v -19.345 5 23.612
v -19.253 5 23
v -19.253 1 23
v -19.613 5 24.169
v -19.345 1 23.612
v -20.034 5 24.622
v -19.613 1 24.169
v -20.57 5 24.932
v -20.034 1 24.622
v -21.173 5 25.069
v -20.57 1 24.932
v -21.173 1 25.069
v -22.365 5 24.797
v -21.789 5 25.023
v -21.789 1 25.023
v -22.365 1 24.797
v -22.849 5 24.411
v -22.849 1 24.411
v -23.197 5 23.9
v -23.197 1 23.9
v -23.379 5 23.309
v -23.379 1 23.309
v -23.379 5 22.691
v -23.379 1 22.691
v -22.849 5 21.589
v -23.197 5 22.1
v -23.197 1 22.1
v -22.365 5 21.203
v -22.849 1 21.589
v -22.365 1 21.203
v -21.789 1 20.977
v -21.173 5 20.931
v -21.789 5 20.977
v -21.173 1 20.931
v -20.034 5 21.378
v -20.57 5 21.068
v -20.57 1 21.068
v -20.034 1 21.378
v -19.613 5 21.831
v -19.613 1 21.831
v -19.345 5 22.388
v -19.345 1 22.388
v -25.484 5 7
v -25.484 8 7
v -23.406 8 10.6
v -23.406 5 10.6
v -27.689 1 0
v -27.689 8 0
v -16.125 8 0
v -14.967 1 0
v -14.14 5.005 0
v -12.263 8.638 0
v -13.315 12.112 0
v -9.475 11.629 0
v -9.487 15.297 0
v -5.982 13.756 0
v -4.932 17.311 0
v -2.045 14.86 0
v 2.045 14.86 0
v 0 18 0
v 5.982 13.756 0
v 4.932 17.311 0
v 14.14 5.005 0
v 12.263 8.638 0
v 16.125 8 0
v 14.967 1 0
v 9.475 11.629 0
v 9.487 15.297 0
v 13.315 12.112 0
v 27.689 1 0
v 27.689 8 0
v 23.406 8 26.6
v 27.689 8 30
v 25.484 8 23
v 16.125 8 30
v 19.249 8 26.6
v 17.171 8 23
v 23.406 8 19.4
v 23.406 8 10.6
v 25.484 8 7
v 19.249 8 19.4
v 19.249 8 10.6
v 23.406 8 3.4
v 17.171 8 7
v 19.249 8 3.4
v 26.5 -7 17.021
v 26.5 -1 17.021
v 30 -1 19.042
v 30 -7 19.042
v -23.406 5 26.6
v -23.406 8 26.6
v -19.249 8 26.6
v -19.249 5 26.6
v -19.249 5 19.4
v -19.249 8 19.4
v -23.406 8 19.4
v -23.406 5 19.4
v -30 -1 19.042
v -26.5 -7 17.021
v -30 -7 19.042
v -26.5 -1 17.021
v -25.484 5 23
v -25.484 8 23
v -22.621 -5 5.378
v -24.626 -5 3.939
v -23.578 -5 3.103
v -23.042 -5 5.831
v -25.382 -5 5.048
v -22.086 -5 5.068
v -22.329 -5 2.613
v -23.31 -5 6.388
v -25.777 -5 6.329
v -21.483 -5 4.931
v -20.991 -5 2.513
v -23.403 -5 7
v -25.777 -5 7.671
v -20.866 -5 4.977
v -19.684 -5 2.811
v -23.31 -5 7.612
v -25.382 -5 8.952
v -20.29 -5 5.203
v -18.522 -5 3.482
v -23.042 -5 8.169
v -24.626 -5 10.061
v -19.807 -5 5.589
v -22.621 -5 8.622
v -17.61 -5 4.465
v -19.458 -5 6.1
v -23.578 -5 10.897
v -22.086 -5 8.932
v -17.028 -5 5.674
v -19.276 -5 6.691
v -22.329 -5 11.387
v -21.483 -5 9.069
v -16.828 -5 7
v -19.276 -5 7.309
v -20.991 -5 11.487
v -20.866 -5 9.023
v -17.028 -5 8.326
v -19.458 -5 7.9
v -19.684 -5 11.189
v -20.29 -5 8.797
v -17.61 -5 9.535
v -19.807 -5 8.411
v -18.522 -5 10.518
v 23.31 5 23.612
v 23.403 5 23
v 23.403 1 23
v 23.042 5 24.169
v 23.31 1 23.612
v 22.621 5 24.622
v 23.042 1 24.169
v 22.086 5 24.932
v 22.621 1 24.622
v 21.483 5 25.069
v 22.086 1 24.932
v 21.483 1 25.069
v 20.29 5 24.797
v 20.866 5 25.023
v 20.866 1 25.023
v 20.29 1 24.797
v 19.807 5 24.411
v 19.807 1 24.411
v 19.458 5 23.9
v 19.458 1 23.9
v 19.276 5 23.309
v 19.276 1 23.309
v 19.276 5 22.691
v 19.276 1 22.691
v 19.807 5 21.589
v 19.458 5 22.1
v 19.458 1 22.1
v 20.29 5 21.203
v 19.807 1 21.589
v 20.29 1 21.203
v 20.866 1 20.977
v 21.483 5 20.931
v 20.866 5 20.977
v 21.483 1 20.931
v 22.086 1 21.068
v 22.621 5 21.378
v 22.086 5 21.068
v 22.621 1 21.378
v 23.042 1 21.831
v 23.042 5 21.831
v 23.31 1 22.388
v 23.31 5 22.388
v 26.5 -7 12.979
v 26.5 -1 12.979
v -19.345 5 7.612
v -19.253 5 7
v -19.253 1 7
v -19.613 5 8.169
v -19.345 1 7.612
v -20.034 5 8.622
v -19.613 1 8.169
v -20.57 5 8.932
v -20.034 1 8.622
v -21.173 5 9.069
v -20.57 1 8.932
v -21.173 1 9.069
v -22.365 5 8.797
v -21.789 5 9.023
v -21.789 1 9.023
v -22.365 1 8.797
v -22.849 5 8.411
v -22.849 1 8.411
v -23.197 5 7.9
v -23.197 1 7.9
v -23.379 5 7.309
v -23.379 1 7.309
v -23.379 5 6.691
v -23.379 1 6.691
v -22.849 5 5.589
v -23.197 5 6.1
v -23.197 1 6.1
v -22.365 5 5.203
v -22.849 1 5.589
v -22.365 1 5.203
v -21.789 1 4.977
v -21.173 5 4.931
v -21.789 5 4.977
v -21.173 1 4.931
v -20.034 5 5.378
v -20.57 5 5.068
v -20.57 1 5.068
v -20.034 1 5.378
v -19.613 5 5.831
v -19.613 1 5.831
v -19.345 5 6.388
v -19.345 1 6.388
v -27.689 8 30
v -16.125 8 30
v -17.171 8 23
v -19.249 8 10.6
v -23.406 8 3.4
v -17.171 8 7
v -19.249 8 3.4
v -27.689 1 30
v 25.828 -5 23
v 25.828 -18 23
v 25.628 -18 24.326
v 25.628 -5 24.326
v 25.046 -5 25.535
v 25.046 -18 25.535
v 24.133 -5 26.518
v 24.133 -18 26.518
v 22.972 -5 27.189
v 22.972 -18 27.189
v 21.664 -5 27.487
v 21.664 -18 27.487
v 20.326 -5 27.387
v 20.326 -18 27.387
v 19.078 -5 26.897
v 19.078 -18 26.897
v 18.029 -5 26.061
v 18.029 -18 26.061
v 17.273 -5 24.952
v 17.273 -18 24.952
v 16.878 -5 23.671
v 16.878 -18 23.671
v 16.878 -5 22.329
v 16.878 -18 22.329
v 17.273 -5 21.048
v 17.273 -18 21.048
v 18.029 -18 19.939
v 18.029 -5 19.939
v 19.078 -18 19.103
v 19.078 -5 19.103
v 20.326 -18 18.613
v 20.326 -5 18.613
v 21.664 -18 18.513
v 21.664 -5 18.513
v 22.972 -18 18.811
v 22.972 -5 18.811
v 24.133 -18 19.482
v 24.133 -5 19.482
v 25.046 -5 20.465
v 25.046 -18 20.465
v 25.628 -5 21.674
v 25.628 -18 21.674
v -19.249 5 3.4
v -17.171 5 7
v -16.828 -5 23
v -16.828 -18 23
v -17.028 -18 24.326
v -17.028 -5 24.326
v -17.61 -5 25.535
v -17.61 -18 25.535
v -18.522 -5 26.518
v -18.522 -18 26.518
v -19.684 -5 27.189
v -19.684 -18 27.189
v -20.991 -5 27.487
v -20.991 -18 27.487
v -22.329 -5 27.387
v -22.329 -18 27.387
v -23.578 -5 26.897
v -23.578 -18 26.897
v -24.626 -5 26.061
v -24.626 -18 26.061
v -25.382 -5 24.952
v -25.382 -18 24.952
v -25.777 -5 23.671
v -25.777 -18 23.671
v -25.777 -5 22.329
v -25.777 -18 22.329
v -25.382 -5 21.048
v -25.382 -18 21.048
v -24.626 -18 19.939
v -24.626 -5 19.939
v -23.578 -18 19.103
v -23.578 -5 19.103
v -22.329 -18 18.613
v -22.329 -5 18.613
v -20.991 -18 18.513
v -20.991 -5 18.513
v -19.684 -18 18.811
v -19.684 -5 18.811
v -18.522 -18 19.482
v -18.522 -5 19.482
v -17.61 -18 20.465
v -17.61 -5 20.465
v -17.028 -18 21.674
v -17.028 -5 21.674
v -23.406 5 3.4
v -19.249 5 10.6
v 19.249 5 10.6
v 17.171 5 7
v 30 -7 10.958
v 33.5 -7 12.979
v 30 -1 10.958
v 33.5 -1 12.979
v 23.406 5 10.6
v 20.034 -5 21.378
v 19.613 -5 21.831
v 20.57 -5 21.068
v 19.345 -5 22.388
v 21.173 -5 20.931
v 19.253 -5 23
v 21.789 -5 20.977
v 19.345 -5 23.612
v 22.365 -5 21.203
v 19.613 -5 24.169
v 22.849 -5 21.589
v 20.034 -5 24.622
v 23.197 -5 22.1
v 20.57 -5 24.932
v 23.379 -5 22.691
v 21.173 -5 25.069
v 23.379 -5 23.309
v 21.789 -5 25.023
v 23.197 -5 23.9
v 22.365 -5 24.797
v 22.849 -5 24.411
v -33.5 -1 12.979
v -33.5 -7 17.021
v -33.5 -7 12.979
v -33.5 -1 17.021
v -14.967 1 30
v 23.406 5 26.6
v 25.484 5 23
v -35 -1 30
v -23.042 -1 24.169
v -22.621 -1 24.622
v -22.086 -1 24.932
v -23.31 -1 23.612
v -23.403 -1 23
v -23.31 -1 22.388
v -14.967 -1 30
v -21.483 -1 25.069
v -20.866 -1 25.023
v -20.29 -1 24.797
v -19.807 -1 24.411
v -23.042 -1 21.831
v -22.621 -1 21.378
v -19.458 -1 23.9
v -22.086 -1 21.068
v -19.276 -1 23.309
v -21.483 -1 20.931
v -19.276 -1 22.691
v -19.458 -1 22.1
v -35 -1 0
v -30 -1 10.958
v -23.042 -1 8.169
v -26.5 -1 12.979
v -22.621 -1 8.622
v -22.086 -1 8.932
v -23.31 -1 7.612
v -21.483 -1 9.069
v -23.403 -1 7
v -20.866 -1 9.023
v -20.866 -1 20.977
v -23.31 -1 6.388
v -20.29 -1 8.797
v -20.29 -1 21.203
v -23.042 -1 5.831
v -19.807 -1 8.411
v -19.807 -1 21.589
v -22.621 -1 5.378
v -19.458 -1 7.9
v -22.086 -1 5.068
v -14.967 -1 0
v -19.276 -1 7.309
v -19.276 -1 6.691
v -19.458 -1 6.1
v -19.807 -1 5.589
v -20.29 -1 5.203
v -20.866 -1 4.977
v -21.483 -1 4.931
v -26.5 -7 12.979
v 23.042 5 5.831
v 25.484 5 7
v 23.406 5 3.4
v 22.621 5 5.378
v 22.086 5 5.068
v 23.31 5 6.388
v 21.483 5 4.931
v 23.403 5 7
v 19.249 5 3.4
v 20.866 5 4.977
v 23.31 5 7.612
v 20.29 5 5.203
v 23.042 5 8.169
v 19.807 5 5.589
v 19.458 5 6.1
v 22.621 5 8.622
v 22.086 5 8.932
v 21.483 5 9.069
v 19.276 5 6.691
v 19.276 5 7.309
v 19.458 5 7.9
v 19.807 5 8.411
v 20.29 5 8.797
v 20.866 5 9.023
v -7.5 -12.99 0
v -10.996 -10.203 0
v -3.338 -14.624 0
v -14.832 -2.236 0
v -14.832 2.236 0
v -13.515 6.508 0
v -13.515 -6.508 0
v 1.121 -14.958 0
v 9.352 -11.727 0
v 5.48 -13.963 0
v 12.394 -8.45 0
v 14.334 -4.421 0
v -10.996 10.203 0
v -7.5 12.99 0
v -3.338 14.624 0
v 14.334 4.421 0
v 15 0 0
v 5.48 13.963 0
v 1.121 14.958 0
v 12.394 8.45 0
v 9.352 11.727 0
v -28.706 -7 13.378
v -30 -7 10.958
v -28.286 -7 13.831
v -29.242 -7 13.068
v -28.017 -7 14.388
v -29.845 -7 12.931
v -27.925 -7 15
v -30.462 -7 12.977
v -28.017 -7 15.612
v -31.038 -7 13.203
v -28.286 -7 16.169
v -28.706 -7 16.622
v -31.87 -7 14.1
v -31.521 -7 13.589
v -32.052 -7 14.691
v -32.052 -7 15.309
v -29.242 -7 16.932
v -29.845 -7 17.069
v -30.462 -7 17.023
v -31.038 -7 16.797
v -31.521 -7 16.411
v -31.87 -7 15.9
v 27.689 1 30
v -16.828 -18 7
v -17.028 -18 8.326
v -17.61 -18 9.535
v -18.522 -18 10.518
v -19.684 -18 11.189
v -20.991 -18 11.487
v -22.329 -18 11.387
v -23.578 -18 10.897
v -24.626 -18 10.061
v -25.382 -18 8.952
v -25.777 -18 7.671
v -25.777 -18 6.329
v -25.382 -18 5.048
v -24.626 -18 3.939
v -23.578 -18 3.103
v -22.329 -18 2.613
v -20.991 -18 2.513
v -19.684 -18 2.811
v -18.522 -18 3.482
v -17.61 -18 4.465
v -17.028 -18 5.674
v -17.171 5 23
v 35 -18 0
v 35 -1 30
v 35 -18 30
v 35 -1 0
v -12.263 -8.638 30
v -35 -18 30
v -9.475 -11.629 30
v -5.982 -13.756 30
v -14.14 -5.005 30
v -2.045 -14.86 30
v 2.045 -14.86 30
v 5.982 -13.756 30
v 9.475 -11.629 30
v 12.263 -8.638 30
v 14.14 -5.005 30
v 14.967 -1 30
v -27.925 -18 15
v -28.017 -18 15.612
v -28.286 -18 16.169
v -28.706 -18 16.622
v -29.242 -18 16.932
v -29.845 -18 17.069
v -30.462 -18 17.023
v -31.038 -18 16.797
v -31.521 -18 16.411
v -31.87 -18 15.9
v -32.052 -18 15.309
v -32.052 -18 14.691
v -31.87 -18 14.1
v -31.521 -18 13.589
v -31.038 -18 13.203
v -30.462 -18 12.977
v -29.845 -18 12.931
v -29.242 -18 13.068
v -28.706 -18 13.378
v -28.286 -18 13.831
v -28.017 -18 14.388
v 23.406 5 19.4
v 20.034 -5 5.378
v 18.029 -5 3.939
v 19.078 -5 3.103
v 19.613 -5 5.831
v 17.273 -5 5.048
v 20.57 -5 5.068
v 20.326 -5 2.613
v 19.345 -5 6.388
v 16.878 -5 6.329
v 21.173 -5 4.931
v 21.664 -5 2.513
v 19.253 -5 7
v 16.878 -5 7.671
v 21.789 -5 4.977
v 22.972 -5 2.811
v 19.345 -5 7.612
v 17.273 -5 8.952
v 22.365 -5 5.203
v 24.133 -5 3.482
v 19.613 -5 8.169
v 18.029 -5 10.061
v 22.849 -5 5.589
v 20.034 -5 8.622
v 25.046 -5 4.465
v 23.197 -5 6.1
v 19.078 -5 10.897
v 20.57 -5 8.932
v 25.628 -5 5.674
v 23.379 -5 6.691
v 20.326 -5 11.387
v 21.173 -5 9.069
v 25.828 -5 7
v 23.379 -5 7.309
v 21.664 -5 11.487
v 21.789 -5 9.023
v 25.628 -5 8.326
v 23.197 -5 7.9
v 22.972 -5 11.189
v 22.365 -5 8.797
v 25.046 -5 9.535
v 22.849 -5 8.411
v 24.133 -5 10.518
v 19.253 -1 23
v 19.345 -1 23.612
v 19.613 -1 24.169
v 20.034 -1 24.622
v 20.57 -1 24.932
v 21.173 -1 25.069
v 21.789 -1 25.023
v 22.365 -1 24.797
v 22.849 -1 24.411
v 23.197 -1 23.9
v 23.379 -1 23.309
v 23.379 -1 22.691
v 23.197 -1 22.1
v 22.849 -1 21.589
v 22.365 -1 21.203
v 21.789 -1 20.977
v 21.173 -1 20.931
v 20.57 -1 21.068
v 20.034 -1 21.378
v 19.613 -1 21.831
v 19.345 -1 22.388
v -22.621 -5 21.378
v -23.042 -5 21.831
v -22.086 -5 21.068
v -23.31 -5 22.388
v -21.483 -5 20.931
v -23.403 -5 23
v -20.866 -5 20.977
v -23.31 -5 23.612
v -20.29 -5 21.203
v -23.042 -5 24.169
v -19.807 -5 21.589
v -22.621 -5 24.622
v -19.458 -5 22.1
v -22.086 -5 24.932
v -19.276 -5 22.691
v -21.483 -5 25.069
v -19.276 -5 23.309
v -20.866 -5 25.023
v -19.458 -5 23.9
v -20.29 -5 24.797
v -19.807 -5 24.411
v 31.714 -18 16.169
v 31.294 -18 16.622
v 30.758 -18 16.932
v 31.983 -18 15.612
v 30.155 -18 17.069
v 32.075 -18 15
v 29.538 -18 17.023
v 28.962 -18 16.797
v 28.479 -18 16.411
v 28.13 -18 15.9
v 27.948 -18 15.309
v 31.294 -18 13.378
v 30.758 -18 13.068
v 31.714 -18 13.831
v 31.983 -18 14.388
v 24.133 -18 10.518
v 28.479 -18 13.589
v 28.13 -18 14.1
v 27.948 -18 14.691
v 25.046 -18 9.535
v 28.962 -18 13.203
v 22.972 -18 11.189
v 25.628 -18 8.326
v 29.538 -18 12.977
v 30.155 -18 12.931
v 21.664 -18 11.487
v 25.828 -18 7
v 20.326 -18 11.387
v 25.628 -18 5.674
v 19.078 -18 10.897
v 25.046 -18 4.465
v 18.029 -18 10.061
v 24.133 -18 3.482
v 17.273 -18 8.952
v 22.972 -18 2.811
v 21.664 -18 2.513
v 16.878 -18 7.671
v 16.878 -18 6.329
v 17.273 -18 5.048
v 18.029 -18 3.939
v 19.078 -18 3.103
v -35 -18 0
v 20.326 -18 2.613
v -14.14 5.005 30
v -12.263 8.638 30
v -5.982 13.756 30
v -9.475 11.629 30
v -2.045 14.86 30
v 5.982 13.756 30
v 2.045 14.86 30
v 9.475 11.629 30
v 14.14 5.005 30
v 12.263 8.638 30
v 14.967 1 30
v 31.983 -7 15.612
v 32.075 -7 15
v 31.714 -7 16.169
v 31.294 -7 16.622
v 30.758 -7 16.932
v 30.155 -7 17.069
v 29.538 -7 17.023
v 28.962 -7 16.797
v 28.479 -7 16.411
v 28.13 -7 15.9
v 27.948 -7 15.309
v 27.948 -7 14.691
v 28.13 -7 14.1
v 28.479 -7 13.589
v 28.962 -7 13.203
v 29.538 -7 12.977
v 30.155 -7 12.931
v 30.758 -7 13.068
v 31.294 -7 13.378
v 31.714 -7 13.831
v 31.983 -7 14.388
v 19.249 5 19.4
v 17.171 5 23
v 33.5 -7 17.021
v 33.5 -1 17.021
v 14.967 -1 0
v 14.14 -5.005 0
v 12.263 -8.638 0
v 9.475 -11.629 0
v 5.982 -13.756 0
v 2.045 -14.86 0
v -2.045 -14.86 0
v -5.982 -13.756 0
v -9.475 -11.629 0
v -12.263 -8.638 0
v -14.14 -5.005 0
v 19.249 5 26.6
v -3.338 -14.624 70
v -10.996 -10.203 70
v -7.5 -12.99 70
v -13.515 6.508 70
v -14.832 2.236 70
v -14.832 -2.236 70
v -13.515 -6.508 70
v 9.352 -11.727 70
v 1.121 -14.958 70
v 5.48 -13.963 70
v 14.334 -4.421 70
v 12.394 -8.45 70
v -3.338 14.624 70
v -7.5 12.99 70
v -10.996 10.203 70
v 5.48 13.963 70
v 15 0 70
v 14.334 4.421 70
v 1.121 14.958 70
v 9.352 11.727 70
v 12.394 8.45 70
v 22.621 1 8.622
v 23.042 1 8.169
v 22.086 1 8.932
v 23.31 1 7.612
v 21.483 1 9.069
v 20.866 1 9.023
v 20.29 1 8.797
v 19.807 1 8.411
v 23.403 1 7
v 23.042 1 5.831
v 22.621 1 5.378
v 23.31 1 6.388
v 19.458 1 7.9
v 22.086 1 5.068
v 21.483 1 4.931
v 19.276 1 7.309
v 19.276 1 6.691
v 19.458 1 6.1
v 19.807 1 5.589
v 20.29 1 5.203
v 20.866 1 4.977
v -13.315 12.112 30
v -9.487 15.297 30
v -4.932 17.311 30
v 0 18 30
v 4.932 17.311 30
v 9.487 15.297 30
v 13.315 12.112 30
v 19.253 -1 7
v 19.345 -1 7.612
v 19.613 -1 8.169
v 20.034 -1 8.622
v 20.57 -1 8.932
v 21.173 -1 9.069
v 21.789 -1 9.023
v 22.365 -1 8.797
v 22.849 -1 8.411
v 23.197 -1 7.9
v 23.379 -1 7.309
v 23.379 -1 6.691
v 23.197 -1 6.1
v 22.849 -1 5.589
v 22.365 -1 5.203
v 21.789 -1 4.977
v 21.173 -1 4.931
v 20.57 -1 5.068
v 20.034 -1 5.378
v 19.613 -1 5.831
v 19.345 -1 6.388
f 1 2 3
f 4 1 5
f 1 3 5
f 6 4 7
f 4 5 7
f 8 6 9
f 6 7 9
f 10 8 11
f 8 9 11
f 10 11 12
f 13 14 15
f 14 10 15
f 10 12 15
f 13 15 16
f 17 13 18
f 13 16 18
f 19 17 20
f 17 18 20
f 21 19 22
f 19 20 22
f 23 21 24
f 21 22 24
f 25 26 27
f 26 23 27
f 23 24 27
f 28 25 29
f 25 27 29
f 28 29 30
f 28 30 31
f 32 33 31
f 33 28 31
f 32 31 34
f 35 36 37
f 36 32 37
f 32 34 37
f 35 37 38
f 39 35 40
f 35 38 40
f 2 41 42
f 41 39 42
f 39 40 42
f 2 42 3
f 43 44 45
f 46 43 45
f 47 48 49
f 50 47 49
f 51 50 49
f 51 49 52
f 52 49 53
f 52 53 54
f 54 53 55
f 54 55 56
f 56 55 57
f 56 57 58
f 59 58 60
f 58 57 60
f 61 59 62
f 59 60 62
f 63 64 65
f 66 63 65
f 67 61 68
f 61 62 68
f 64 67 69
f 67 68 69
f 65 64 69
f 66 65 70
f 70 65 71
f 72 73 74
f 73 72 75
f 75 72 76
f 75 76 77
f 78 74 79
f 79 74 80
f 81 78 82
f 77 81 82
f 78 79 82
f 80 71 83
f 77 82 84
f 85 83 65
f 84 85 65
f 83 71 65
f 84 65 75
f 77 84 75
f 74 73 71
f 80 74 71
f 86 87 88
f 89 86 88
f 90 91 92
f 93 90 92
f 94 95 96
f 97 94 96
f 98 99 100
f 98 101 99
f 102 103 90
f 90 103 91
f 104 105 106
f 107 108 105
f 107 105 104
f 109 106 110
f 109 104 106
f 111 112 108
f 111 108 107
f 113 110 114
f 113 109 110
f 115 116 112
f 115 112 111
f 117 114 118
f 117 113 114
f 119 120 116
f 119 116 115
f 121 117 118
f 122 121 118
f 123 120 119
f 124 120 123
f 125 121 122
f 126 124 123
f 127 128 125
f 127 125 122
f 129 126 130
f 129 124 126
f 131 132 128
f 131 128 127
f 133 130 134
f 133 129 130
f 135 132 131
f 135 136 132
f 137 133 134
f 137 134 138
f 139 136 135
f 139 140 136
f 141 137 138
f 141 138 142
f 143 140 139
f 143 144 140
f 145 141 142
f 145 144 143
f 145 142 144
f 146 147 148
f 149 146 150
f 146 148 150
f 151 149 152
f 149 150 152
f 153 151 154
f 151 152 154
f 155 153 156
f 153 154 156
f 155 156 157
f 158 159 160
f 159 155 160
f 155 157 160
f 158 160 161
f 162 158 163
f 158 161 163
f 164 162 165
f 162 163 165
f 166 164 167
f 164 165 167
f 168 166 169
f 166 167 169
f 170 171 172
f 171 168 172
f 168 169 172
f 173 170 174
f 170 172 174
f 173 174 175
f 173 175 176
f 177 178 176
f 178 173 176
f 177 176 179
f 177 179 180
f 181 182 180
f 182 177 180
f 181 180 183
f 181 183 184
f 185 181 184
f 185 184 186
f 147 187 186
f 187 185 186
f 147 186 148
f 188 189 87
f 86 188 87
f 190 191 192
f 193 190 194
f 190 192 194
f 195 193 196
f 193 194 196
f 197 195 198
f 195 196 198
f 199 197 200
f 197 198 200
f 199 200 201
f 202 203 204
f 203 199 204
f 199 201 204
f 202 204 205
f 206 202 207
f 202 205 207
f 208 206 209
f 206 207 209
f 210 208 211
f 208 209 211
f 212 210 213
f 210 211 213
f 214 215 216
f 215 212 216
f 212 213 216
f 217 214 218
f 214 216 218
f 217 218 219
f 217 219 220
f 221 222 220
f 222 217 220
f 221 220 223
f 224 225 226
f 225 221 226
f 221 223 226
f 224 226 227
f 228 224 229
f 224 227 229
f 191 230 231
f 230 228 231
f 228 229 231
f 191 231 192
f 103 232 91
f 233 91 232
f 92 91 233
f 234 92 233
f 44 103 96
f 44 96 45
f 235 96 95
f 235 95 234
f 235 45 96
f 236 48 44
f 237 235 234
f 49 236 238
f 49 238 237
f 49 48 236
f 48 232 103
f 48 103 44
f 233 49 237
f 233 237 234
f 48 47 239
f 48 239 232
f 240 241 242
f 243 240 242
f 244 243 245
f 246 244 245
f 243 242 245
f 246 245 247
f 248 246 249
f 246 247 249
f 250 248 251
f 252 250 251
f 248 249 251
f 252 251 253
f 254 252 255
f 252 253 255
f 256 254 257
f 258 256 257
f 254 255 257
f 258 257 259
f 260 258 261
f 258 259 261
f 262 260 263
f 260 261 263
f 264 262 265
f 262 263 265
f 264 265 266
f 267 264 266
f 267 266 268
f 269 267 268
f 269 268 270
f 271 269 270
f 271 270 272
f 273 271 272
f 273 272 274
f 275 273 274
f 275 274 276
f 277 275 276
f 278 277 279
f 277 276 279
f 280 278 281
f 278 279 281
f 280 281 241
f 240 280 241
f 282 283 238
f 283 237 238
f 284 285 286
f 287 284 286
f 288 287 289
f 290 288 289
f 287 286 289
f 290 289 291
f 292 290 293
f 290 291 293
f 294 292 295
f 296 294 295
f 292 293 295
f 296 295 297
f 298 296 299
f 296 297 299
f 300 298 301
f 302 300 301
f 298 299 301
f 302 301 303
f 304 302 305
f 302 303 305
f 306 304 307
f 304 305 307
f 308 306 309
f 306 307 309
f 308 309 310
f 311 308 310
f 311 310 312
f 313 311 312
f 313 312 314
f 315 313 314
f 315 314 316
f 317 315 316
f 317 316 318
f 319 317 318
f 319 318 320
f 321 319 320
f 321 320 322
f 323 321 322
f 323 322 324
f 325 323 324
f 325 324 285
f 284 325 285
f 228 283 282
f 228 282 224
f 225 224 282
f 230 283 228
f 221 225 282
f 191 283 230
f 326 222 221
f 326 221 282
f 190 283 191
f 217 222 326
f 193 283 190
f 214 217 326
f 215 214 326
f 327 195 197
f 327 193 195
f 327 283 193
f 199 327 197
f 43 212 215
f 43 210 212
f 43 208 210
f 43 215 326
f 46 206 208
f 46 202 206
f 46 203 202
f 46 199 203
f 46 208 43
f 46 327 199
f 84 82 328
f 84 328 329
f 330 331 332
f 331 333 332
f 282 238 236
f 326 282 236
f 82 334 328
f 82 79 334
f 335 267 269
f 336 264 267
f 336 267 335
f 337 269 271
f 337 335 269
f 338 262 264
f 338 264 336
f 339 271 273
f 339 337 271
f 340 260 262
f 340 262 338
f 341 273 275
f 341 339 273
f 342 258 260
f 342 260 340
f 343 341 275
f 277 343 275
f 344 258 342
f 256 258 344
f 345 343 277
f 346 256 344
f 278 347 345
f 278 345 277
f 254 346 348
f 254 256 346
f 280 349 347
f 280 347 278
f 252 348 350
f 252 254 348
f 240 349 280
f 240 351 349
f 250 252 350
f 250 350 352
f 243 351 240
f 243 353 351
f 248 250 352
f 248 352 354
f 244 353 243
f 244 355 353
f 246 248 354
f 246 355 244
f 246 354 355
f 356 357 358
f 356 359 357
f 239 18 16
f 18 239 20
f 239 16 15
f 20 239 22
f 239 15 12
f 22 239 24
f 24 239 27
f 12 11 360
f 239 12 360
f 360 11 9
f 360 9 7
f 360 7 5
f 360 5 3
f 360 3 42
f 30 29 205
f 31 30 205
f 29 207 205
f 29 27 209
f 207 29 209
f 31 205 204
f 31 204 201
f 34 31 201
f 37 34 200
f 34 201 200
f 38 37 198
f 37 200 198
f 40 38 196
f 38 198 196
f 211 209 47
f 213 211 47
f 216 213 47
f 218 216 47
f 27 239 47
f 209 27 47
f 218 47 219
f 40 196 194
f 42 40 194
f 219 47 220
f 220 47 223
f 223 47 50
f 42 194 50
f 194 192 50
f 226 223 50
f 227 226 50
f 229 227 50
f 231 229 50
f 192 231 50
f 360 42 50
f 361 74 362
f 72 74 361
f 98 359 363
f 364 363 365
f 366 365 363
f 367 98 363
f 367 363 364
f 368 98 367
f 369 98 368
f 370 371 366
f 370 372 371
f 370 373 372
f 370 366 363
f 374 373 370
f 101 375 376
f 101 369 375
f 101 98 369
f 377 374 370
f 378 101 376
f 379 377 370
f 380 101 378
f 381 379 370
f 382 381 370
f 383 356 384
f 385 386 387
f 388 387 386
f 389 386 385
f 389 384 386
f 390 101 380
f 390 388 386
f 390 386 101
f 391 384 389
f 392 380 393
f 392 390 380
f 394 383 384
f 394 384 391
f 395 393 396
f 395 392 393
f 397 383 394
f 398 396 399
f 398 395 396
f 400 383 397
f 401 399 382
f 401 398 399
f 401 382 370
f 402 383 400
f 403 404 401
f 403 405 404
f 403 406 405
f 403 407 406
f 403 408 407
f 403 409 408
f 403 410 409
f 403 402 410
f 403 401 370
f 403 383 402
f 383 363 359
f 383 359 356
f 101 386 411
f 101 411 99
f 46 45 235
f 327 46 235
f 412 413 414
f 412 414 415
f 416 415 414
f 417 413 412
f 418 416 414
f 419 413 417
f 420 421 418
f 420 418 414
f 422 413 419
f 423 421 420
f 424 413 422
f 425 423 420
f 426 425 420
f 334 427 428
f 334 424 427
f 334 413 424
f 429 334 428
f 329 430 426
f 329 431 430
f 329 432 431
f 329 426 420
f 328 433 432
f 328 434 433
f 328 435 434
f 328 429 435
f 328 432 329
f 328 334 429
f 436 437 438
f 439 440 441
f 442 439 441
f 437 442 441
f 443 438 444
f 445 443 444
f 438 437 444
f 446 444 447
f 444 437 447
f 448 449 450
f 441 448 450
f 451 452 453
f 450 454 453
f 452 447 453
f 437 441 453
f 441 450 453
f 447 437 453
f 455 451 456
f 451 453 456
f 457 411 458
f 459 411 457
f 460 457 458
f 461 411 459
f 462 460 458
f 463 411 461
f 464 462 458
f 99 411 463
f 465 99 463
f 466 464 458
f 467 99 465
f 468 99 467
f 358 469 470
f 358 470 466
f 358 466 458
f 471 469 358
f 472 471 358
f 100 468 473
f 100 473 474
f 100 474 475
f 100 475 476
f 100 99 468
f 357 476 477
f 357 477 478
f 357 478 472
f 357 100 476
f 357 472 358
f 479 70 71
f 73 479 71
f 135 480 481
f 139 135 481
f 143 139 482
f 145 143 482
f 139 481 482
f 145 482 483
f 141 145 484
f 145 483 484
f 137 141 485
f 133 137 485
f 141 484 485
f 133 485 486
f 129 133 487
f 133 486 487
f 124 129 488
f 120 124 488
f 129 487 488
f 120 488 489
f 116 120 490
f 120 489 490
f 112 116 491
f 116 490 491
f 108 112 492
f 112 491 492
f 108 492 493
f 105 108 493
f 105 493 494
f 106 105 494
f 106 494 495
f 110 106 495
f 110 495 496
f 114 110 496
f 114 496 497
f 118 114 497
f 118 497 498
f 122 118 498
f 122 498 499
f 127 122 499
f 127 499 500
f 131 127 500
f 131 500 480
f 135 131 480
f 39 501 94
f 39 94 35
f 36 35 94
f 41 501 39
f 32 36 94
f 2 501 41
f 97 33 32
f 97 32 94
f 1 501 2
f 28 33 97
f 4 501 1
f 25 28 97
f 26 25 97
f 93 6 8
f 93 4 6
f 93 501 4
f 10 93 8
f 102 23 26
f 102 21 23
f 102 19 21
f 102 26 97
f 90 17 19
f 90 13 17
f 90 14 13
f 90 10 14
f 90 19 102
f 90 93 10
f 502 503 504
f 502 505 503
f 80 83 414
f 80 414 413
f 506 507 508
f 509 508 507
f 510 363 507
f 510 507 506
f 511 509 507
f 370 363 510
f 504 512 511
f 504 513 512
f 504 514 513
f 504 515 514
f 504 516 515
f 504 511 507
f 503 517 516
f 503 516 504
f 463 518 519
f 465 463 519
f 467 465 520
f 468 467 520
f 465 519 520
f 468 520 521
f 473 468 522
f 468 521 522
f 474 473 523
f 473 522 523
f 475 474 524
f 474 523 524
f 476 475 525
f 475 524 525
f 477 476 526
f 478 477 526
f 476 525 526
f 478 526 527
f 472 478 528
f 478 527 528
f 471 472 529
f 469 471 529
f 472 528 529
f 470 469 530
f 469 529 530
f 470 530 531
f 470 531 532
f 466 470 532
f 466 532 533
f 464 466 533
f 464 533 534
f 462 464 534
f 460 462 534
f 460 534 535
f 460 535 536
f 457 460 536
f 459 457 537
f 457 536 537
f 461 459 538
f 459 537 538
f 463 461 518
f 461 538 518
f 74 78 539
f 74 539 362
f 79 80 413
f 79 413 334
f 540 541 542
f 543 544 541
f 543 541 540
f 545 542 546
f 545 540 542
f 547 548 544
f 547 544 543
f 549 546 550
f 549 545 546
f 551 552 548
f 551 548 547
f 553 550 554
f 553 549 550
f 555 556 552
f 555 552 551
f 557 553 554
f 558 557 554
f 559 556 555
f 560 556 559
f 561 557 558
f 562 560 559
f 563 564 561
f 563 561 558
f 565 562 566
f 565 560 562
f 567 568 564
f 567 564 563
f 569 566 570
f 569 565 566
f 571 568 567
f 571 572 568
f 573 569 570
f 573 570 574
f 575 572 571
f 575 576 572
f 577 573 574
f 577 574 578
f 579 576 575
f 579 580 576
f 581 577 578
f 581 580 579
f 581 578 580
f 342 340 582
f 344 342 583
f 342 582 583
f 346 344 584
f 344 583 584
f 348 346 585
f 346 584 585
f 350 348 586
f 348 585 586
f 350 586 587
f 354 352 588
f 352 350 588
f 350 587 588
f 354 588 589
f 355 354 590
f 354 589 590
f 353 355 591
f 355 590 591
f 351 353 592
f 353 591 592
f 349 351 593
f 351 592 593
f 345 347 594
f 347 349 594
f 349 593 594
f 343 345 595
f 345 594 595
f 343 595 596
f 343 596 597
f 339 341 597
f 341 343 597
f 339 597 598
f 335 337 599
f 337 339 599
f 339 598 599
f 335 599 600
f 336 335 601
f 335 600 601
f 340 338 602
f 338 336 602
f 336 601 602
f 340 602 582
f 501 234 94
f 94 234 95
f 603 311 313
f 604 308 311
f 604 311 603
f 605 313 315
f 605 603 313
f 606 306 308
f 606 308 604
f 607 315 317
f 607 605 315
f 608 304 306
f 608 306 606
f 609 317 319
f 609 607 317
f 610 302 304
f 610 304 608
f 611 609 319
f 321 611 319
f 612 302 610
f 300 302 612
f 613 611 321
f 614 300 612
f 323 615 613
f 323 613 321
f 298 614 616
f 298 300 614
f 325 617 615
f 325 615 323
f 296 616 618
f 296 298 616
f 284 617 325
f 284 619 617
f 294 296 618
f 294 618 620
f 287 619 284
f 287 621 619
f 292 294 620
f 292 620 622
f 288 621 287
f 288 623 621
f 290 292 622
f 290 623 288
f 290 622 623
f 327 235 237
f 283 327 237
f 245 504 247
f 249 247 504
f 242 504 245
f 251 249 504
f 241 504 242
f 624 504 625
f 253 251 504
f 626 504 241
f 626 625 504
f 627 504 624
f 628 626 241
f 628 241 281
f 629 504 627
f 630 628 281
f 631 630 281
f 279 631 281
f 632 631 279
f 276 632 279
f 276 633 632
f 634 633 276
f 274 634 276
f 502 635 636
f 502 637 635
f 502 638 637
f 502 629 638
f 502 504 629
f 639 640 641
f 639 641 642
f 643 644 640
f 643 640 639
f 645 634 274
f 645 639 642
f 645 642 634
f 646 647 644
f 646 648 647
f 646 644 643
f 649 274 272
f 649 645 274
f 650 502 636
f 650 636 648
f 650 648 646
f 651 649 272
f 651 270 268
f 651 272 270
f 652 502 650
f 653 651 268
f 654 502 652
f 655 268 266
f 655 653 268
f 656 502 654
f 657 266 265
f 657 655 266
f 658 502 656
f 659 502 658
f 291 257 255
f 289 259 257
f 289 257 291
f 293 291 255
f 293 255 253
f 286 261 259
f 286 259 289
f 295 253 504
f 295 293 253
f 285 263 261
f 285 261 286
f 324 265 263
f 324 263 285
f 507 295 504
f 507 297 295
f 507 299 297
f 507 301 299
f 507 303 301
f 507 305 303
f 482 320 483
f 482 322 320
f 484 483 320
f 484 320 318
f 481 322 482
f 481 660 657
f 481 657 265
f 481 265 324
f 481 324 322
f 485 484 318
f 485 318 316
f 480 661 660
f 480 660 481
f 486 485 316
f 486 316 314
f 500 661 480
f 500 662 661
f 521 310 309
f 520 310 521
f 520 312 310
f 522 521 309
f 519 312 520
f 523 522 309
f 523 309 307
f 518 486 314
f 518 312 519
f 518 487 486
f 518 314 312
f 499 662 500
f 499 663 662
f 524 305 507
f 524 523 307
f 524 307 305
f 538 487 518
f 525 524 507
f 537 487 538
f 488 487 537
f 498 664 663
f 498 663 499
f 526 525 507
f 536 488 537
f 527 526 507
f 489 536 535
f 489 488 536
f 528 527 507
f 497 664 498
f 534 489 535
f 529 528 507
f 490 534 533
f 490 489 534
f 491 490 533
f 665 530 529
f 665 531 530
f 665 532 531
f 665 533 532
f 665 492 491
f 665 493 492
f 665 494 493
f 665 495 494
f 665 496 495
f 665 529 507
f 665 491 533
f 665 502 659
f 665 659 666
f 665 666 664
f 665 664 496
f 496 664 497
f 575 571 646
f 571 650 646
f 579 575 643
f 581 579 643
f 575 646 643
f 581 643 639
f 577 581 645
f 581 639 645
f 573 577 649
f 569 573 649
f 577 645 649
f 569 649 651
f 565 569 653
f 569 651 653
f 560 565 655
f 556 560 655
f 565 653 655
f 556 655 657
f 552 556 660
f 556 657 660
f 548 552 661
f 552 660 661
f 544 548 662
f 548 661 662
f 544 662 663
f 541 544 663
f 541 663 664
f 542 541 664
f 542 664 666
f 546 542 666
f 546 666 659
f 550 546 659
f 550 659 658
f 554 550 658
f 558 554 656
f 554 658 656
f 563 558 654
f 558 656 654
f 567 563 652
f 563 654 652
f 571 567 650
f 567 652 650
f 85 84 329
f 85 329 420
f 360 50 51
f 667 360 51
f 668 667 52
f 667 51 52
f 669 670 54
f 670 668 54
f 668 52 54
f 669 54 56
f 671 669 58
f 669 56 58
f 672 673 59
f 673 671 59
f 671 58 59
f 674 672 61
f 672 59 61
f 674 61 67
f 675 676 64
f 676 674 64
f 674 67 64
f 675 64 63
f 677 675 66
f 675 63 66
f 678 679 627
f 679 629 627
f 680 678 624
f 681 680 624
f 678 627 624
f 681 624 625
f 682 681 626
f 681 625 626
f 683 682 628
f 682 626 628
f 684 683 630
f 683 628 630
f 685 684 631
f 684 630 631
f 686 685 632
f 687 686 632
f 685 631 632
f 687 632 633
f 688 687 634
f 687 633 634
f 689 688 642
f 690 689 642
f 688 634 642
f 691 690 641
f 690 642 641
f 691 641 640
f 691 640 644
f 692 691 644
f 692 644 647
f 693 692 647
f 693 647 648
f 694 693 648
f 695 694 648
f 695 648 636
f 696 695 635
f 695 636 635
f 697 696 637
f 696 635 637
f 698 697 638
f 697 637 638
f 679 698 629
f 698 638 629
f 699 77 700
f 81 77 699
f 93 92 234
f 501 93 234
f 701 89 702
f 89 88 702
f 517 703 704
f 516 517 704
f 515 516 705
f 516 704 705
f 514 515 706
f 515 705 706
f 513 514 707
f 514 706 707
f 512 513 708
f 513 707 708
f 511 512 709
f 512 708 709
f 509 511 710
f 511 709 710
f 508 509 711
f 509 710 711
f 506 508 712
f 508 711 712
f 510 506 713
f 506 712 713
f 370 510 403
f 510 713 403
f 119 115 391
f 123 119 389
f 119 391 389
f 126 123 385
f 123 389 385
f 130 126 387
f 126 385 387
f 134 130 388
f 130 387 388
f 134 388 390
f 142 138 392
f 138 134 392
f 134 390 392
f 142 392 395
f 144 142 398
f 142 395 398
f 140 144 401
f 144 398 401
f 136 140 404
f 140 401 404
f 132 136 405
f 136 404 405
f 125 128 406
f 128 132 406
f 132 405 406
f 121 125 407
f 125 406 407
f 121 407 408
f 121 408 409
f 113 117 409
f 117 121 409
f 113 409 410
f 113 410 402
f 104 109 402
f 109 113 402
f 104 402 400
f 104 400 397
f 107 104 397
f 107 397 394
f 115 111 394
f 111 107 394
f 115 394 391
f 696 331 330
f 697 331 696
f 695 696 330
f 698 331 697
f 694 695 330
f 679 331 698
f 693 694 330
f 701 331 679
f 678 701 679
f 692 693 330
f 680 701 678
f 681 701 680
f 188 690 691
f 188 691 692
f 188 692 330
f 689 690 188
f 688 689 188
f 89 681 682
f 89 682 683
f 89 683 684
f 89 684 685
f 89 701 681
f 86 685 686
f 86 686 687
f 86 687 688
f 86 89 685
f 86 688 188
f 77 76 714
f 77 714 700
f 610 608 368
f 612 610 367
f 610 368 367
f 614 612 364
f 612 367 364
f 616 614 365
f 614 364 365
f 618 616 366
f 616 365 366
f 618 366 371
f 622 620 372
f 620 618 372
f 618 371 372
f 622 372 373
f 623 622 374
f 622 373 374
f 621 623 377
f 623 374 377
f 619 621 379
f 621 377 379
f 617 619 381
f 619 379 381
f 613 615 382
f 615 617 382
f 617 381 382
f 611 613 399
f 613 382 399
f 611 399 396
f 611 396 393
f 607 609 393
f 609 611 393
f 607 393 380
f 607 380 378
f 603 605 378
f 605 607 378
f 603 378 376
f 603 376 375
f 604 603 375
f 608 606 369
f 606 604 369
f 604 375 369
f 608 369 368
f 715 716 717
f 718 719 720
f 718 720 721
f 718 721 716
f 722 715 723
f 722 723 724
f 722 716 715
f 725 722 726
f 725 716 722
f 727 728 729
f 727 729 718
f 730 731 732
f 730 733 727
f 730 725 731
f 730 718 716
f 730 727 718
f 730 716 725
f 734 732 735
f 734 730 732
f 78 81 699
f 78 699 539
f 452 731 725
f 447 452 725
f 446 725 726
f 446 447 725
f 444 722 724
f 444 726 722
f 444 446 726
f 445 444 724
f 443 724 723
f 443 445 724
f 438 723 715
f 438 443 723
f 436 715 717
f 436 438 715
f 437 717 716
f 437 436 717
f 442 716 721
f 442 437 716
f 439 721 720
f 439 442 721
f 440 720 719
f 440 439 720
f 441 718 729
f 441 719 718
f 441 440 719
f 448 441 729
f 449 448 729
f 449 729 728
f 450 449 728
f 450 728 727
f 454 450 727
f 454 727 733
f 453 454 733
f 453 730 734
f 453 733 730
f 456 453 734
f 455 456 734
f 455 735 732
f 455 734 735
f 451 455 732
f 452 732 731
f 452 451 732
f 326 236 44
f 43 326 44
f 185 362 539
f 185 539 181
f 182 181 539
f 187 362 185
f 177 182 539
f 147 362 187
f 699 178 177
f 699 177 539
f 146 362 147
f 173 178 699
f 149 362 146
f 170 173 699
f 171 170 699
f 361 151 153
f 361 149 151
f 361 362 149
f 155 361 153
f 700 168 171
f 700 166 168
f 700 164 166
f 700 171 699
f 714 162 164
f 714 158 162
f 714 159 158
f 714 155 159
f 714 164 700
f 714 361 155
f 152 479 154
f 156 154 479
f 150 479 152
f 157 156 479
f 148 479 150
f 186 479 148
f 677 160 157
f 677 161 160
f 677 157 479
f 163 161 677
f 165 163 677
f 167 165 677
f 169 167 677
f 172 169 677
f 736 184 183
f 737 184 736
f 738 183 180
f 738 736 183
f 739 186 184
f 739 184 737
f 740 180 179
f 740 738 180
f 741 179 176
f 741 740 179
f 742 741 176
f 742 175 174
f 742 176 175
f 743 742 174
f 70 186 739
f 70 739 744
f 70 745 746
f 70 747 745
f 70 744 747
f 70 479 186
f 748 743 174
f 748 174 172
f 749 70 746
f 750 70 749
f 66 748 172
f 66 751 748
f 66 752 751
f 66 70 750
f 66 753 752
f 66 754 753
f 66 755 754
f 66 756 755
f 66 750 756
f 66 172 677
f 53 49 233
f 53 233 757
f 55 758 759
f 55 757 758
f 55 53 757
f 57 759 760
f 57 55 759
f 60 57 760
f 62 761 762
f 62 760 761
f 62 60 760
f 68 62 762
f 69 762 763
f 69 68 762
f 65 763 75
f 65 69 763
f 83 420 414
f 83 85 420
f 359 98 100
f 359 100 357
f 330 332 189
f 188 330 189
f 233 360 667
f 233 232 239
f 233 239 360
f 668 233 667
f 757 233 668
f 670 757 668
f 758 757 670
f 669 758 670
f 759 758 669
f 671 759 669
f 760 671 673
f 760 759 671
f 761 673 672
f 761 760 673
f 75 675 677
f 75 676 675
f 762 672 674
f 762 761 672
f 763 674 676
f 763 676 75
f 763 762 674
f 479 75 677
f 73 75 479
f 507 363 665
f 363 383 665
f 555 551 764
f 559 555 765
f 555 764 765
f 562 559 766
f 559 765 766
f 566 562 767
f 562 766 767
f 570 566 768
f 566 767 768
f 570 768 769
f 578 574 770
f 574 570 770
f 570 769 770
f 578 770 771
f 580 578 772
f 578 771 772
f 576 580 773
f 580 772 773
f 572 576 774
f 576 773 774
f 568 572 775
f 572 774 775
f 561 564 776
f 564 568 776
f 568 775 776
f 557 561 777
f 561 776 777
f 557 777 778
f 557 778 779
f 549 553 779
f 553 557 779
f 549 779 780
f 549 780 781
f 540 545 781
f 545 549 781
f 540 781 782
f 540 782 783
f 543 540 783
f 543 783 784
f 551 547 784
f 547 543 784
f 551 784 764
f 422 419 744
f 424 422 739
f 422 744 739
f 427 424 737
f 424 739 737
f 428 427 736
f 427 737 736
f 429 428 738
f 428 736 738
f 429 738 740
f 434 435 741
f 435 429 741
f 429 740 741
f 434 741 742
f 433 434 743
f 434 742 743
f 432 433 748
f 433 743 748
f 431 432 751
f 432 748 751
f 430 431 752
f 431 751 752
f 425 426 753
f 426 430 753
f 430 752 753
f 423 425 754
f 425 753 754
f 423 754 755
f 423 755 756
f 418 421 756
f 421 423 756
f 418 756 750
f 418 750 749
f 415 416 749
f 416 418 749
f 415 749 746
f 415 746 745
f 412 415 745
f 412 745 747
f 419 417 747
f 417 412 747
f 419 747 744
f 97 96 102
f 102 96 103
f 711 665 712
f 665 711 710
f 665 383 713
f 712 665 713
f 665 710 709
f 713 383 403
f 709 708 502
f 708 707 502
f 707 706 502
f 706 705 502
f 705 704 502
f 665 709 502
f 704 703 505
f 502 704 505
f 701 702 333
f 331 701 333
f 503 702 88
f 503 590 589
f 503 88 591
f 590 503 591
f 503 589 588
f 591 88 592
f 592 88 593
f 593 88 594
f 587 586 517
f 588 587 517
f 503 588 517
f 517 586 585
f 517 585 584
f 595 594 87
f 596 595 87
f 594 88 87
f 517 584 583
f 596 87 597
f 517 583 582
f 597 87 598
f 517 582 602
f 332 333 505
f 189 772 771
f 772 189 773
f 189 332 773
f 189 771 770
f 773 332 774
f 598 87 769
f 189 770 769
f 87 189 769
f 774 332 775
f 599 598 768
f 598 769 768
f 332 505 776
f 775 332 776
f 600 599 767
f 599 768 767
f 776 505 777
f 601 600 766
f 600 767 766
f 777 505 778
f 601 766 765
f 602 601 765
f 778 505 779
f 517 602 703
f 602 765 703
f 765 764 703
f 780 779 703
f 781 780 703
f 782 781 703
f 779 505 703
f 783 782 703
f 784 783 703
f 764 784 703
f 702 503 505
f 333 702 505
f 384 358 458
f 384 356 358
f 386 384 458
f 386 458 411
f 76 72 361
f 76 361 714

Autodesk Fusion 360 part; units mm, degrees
sketch "Sketch1" plane through (0, 0, 0) normal (0, 0, 1) x (1, 0, 0) in component "Pipe"
  circle A0 centre (0, 0) radius 15
  dimension "d1" = 30
extrude "Extrude1" add sketch "Sketch1" along normal blind 70 makes body 1 in component "Pipe"
sketch "Sketch1 (2)" plane through (0, 0, 0) normal (0, 0, 1) x (1, 0, 0) in component "holder_under"
  circle A0 centre (0, 0) radius 15
  circle A1 centre (0, 0) radius 18
  line L0 (-17.9722, 1) -> (-27.6886, 1)
  line L1 (-27.6886, 1) -> (-27.6886, 8)
  line L2 (-27.6886, 8) -> (-12.6886, 8)
  line L3 (0, 0) -> (0, 15) construction
  line L4 (27.6886, 8) -> (12.6886, 8)
  line L5 (27.6886, 1) -> (27.6886, 8)
  line L6 (17.9722, 1) -> (27.6886, 1)
  line L7 (-17.9722, 1) -> (-14.9666, 1)
  line L8 (17.9722, 1) -> (14.9666, 1)
  dimension "d4" = 3
  dimension "d5" = 7
  dimension "d6" = 15
  dimension "d7" = 1
extrude "Extrude1'" add sketch "Sketch1 (2)" along normal blind 30 separate body contours A0 A1 L4 L8 | A0 A1 L2 L7 | A0 A1 L2 L4 | A1 L4 L5 L6 | A1 L0 L1 L2 makes body 2 in component "holder_under"
sketch "Sketch2" plane through (0, 1, 0) normal (0, -1, 0) x (1, 0, 0) in component "holder_under"
  line L0 (14.9666, 0) -> (27.6886, 0)
  line L1 (27.6886, 0) -> (27.6886, 30)
  line L2 (27.6886, 30) -> (14.9666, 30)
  line L3 (14.9666, 30) -> (14.9666, 0)
  line L4 (-21.3276, 30) -> (-21.3276, 0) construction
  line L5 (-27.6886, 30) -> (-14.9666, 30)
  line L6 (-14.9666, 0) -> (-27.6886, 0)
  line L7 (0, 0) -> (0, 30) construction
  line L8 (-14.9666, 30) -> (14.9666, 30)
  circle A0 centre (-21.3276, 23) radius 2.075
  circle A1 centre (-21.3276, 7) radius 2.075
  circle A2 centre (21.3276, 23) radius 2.075
  circle A3 centre (21.3276, 7) radius 2.075
  dimension "d10" = 4.15
  dimension "d11" = 4.15
  dimension "d12" = 7
  dimension "d13" = 7
extrude "Extrude2" cut sketch "Sketch2" against normal up to surface (7 mm away) contours A0 | A1 | A2 | A3 bodies 2 in component "holder_under"
sketch "Sketch1 (3)" plane through (0, 0, 0) normal (0, 0, 1) x (1, 0, 0) in component "holder_top"
  circle A0 centre (0, 0) radius 15
  circle A1 centre (0, 0) radius 18
  line L0 (-17.9722, -1) -> (-35, -1)
  line L1 (-35, -1) -> (-35, -18)
  line L2 (-35, -18) -> (0, -18)
  line L3 (0, 0) -> (0, -18) construction
  line L4 (35, -1) -> (35, -18)
  line L5 (35, -18) -> (0, -18)
  line L6 (17.9722, -1) -> (35, -1)
  line L7 (17.9722, -1) -> (14.9666, -1)
  line L8 (-17.9722, -1) -> (-14.9666, -1)
  dimension "d16" = 3
  dimension "d17" = 1
  dimension "d18" = 35
extrude "Extrude1''" add sketch "Sketch1 (3)" along normal up to surface (30 mm away) separate body contours A0 A1 L7 L8 | A1 L0 L1 L2 | A1 L4 L5 L6 picked at (-1.1817, -16.9303) makes body 3 in component "holder_top"
sketch "Sketch2 (2)" plane through (0, -1, 0) normal (0, 1, 0) x (-1, 0, 0) in component "holder_top"
  line L0 (-14.9666, 30) -> (-35, 30)
  line L1 (-35, 30) -> (-35, 0)
  line L2 (-35, 0) -> (-14.9666, 0)
  line L3 (-14.9666, 0) -> (-14.9666, 30)
  circle A0 centre (-21.3276, 23) radius 2.075
  circle A1 centre (-21.3276, 7) radius 2.075
  circle A2 centre (21.3276, 7) radius 2.075
  circle A3 centre (21.3276, 23) radius 2.075
extrude "Extrude2'" cut sketch "Sketch2 (2)" against normal up to surface (17 mm away) contours A0 | A1 | A2 | A3 bodies 3 in component "holder_top"
sketch "Sketch3" plane through (0, 8, 0) normal (0, 1, 0) x (-1, 0, 0) in component "holder_under"
  circle A0 centre (21.3276, 7) radius 2.075
  circle A1 centre (21.3276, 23) radius 2.075
  line L0 (16.1245, 0) -> (27.6886, 0)
  line L1 (27.6886, 0) -> (27.6886, 30)
  line L2 (27.6886, 30) -> (16.1245, 30)
  line L3 (16.1245, 30) -> (16.1245, 0)
  line L4 (23.4061, 19.4) -> (25.4845, 23)
  line L5 (25.4845, 23) -> (23.4061, 26.6)
  line L6 (23.4061, 26.6) -> (19.2491, 26.6)
  line L7 (19.2491, 26.6) -> (17.1707, 23)
  line L8 (17.1707, 23) -> (19.2491, 19.4)
  line L9 (19.2491, 19.4) -> (23.4061, 19.4)
  line L10 (19.2491, 10.6) -> (17.1707, 7)
  line L11 (17.1707, 7) -> (19.2491, 3.4)
  line L12 (19.2491, 3.4) -> (23.4061, 3.4)
  line L13 (23.4061, 3.4) -> (25.4845, 7)
  line L14 (25.4845, 7) -> (23.4061, 10.6)
  line L15 (23.4061, 10.6) -> (19.2491, 10.6)
  line L16 (0, 0) -> (0, 30) construction
  line L17 (16.1245, 30) -> (-16.1245, 30)
  line L18 (-19.2491, 19.4) -> (-23.4061, 19.4)
  line L19 (-23.4061, 3.4) -> (-25.4845, 7)
  line L20 (-25.4845, 23) -> (-23.4061, 26.6)
  line L21 (-25.4845, 7) -> (-23.4061, 10.6)
  circle A2 centre (-21.3276, 7) radius 2.075
  circle A3 centre (-21.3276, 23) radius 2.075
  line L22 (-23.4061, 19.4) -> (-25.4845, 23)
  line L23 (-19.2491, 10.6) -> (-17.1707, 7)
  line L24 (-19.2491, 26.6) -> (-17.1707, 23)
  line L25 (-17.1707, 7) -> (-19.2491, 3.4)
  line L26 (-23.4061, 26.6) -> (-19.2491, 26.6)
  line L27 (-23.4061, 10.6) -> (-19.2491, 10.6)
  line L28 (-17.1707, 23) -> (-19.2491, 19.4)
  line L29 (-19.2491, 3.4) -> (-23.4061, 3.4)
  point P0 (21.3276, 23)
  point P1 (21.3276, 7)
  point P2 (-21.3276, 23)
  point P3 (-21.3276, 7)
  dimension "d23" = 7.2
  dimension "d24" = 7.2
extrude "Extrude3" cut sketch "Sketch3" against normal blind 3 contours L4 L5 L6 L7 L8 L9 | L10 L11 L12 L13 L14 L15 | L18 L20 L22 L24 L26 L28 | L19 L21 L23 L25 L27 L29 bodies 2 in component "holder_under"
sketch "Sketch3 (2)" plane through (0, -18, 0) normal (0, -1, 0) x (1, 0, 0) in component "holder_top"
  circle A0 centre (21.3276, 7) radius 2.075
  circle A1 centre (-21.3276, 7) radius 2.075
  circle A2 centre (21.3276, 23) radius 2.075
  circle A3 centre (-21.3276, 23) radius 2.075
  line L0 (35, 30) -> (-35, 30)
  line L1 (-35, 30) -> (-35, 0)
  line L2 (-35, 0) -> (35, 0)
  line L3 (35, 0) -> (35, 30)
  circle A4 centre (-21.3276, 23) radius 4.5
  circle A5 centre (-21.3276, 7) radius 4.5
  circle A6 centre (21.3276, 7) radius 4.5
  circle A7 centre (21.3276, 23) radius 4.5
  dimension "d27" = 9
  dimension "d28" = 9
  dimension "d29" = 9
  dimension "d30" = 9
extrude "Extrude3'" cut sketch "Sketch3 (2)" against normal up to surface (13 mm away) contours A4 | A5 | A6 | A7 bodies 3 in component "holder_top"
sketch "Sketch1 (4)" plane through (0, -18, 0) normal (0, -1, 0) x (1, 0, 0)
  circle A0 centre (-21.3276, 7) radius 4.5
  circle A1 centre (21.3276, 7) radius 4.5
  circle A2 centre (-21.3276, 23) radius 4.5
  circle A3 centre (21.3276, 23) radius 4.5
  line L0 (35, 30) -> (-35, 30)
  line L1 (-35, 30) -> (-35, 0)
  line L2 (-35, 0) -> (35, 0)
  line L3 (35, 0) -> (35, 30)
sketch "Sketch4" plane through (0, -18, 15) normal (0, -1, 0) x (1, 0, 0) in component "holder_top"
  line L0 (0, 0) -> (-35, 0) construction
  line L1 (-35, 15) -> (-35, -15)
  line L2 (0, 0) -> (0, 15) construction
  circle A0 centre (-30, 0) radius 2.075
  line L3 (35, 15) -> (-35, 15)
  circle A1 centre (30, 0) radius 2.075
  dimension "d33" = 4.15
  dimension "d34" = 5
extrude "Extrude4" cut sketch "Sketch4" against normal up to surface (17 mm away) bodies 3 in component "holder_top"
sketch "Sketch5" plane through (0, -1, 0) normal (0, 1, 0) x (-1, 0, 0) in component "holder_top"
  circle A0 centre (-30, 15) radius 2.075
  circle A1 centre (-21.3276, 7) radius 2.075
  circle A2 centre (-21.3276, 23) radius 2.075
  line L0 (-14.9666, 30) -> (-35, 30)
  line L1 (-35, 30) -> (-35, 0)
  line L2 (-35, 0) -> (-14.9666, 0)
  line L3 (-14.9666, 0) -> (-14.9666, 30)
  line L4 (-30, 19.0415) -> (-33.5, 17.0207)
  line L5 (-33.5, 17.0207) -> (-33.5, 12.9793)
  line L6 (-33.5, 12.9793) -> (-30, 10.9585)
  line L7 (-30, 10.9585) -> (-26.5, 12.9793)
  line L8 (-26.5, 12.9793) -> (-26.5, 17.0207)
  line L9 (-26.5, 17.0207) -> (-30, 19.0415)
  line L10 (0, 0) -> (0, 30) construction
  line L11 (-35, 30) -> (35, 30)
  line L12 (26.5, 17.0207) -> (30, 19.0415)
  line L13 (30, 19.0415) -> (33.5, 17.0207)
  line L14 (33.5, 17.0207) -> (33.5, 12.9793)
  line L15 (33.5, 12.9793) -> (30, 10.9585)
  line L16 (30, 10.9585) -> (26.5, 12.9793)
  line L17 (26.5, 12.9793) -> (26.5, 17.0207)
  point P0 (-30, 15)
  dimension "d40" = 7
extrude "Extrude5" cut sketch "Sketch5" against normal blind 6 contours L4 L5 L6 L7 L8 L9 | L12 L13 L14 L15 L16 L17 bodies 3 in component "holder_top"
component "Pipe" placed x (1, 0, 0) y (0, 1, 0) z (0, 0, 1) at (0, 0, 0)
component "holder_under" placed x (1, 0, 0) y (0, 1, 0) z (0, 0, 1) at (0, 0, 0)
component "holder_top" placed x (1, 0, 0) y (0, 1, 0) z (0, 0, 1) at (0, 0, 0)
